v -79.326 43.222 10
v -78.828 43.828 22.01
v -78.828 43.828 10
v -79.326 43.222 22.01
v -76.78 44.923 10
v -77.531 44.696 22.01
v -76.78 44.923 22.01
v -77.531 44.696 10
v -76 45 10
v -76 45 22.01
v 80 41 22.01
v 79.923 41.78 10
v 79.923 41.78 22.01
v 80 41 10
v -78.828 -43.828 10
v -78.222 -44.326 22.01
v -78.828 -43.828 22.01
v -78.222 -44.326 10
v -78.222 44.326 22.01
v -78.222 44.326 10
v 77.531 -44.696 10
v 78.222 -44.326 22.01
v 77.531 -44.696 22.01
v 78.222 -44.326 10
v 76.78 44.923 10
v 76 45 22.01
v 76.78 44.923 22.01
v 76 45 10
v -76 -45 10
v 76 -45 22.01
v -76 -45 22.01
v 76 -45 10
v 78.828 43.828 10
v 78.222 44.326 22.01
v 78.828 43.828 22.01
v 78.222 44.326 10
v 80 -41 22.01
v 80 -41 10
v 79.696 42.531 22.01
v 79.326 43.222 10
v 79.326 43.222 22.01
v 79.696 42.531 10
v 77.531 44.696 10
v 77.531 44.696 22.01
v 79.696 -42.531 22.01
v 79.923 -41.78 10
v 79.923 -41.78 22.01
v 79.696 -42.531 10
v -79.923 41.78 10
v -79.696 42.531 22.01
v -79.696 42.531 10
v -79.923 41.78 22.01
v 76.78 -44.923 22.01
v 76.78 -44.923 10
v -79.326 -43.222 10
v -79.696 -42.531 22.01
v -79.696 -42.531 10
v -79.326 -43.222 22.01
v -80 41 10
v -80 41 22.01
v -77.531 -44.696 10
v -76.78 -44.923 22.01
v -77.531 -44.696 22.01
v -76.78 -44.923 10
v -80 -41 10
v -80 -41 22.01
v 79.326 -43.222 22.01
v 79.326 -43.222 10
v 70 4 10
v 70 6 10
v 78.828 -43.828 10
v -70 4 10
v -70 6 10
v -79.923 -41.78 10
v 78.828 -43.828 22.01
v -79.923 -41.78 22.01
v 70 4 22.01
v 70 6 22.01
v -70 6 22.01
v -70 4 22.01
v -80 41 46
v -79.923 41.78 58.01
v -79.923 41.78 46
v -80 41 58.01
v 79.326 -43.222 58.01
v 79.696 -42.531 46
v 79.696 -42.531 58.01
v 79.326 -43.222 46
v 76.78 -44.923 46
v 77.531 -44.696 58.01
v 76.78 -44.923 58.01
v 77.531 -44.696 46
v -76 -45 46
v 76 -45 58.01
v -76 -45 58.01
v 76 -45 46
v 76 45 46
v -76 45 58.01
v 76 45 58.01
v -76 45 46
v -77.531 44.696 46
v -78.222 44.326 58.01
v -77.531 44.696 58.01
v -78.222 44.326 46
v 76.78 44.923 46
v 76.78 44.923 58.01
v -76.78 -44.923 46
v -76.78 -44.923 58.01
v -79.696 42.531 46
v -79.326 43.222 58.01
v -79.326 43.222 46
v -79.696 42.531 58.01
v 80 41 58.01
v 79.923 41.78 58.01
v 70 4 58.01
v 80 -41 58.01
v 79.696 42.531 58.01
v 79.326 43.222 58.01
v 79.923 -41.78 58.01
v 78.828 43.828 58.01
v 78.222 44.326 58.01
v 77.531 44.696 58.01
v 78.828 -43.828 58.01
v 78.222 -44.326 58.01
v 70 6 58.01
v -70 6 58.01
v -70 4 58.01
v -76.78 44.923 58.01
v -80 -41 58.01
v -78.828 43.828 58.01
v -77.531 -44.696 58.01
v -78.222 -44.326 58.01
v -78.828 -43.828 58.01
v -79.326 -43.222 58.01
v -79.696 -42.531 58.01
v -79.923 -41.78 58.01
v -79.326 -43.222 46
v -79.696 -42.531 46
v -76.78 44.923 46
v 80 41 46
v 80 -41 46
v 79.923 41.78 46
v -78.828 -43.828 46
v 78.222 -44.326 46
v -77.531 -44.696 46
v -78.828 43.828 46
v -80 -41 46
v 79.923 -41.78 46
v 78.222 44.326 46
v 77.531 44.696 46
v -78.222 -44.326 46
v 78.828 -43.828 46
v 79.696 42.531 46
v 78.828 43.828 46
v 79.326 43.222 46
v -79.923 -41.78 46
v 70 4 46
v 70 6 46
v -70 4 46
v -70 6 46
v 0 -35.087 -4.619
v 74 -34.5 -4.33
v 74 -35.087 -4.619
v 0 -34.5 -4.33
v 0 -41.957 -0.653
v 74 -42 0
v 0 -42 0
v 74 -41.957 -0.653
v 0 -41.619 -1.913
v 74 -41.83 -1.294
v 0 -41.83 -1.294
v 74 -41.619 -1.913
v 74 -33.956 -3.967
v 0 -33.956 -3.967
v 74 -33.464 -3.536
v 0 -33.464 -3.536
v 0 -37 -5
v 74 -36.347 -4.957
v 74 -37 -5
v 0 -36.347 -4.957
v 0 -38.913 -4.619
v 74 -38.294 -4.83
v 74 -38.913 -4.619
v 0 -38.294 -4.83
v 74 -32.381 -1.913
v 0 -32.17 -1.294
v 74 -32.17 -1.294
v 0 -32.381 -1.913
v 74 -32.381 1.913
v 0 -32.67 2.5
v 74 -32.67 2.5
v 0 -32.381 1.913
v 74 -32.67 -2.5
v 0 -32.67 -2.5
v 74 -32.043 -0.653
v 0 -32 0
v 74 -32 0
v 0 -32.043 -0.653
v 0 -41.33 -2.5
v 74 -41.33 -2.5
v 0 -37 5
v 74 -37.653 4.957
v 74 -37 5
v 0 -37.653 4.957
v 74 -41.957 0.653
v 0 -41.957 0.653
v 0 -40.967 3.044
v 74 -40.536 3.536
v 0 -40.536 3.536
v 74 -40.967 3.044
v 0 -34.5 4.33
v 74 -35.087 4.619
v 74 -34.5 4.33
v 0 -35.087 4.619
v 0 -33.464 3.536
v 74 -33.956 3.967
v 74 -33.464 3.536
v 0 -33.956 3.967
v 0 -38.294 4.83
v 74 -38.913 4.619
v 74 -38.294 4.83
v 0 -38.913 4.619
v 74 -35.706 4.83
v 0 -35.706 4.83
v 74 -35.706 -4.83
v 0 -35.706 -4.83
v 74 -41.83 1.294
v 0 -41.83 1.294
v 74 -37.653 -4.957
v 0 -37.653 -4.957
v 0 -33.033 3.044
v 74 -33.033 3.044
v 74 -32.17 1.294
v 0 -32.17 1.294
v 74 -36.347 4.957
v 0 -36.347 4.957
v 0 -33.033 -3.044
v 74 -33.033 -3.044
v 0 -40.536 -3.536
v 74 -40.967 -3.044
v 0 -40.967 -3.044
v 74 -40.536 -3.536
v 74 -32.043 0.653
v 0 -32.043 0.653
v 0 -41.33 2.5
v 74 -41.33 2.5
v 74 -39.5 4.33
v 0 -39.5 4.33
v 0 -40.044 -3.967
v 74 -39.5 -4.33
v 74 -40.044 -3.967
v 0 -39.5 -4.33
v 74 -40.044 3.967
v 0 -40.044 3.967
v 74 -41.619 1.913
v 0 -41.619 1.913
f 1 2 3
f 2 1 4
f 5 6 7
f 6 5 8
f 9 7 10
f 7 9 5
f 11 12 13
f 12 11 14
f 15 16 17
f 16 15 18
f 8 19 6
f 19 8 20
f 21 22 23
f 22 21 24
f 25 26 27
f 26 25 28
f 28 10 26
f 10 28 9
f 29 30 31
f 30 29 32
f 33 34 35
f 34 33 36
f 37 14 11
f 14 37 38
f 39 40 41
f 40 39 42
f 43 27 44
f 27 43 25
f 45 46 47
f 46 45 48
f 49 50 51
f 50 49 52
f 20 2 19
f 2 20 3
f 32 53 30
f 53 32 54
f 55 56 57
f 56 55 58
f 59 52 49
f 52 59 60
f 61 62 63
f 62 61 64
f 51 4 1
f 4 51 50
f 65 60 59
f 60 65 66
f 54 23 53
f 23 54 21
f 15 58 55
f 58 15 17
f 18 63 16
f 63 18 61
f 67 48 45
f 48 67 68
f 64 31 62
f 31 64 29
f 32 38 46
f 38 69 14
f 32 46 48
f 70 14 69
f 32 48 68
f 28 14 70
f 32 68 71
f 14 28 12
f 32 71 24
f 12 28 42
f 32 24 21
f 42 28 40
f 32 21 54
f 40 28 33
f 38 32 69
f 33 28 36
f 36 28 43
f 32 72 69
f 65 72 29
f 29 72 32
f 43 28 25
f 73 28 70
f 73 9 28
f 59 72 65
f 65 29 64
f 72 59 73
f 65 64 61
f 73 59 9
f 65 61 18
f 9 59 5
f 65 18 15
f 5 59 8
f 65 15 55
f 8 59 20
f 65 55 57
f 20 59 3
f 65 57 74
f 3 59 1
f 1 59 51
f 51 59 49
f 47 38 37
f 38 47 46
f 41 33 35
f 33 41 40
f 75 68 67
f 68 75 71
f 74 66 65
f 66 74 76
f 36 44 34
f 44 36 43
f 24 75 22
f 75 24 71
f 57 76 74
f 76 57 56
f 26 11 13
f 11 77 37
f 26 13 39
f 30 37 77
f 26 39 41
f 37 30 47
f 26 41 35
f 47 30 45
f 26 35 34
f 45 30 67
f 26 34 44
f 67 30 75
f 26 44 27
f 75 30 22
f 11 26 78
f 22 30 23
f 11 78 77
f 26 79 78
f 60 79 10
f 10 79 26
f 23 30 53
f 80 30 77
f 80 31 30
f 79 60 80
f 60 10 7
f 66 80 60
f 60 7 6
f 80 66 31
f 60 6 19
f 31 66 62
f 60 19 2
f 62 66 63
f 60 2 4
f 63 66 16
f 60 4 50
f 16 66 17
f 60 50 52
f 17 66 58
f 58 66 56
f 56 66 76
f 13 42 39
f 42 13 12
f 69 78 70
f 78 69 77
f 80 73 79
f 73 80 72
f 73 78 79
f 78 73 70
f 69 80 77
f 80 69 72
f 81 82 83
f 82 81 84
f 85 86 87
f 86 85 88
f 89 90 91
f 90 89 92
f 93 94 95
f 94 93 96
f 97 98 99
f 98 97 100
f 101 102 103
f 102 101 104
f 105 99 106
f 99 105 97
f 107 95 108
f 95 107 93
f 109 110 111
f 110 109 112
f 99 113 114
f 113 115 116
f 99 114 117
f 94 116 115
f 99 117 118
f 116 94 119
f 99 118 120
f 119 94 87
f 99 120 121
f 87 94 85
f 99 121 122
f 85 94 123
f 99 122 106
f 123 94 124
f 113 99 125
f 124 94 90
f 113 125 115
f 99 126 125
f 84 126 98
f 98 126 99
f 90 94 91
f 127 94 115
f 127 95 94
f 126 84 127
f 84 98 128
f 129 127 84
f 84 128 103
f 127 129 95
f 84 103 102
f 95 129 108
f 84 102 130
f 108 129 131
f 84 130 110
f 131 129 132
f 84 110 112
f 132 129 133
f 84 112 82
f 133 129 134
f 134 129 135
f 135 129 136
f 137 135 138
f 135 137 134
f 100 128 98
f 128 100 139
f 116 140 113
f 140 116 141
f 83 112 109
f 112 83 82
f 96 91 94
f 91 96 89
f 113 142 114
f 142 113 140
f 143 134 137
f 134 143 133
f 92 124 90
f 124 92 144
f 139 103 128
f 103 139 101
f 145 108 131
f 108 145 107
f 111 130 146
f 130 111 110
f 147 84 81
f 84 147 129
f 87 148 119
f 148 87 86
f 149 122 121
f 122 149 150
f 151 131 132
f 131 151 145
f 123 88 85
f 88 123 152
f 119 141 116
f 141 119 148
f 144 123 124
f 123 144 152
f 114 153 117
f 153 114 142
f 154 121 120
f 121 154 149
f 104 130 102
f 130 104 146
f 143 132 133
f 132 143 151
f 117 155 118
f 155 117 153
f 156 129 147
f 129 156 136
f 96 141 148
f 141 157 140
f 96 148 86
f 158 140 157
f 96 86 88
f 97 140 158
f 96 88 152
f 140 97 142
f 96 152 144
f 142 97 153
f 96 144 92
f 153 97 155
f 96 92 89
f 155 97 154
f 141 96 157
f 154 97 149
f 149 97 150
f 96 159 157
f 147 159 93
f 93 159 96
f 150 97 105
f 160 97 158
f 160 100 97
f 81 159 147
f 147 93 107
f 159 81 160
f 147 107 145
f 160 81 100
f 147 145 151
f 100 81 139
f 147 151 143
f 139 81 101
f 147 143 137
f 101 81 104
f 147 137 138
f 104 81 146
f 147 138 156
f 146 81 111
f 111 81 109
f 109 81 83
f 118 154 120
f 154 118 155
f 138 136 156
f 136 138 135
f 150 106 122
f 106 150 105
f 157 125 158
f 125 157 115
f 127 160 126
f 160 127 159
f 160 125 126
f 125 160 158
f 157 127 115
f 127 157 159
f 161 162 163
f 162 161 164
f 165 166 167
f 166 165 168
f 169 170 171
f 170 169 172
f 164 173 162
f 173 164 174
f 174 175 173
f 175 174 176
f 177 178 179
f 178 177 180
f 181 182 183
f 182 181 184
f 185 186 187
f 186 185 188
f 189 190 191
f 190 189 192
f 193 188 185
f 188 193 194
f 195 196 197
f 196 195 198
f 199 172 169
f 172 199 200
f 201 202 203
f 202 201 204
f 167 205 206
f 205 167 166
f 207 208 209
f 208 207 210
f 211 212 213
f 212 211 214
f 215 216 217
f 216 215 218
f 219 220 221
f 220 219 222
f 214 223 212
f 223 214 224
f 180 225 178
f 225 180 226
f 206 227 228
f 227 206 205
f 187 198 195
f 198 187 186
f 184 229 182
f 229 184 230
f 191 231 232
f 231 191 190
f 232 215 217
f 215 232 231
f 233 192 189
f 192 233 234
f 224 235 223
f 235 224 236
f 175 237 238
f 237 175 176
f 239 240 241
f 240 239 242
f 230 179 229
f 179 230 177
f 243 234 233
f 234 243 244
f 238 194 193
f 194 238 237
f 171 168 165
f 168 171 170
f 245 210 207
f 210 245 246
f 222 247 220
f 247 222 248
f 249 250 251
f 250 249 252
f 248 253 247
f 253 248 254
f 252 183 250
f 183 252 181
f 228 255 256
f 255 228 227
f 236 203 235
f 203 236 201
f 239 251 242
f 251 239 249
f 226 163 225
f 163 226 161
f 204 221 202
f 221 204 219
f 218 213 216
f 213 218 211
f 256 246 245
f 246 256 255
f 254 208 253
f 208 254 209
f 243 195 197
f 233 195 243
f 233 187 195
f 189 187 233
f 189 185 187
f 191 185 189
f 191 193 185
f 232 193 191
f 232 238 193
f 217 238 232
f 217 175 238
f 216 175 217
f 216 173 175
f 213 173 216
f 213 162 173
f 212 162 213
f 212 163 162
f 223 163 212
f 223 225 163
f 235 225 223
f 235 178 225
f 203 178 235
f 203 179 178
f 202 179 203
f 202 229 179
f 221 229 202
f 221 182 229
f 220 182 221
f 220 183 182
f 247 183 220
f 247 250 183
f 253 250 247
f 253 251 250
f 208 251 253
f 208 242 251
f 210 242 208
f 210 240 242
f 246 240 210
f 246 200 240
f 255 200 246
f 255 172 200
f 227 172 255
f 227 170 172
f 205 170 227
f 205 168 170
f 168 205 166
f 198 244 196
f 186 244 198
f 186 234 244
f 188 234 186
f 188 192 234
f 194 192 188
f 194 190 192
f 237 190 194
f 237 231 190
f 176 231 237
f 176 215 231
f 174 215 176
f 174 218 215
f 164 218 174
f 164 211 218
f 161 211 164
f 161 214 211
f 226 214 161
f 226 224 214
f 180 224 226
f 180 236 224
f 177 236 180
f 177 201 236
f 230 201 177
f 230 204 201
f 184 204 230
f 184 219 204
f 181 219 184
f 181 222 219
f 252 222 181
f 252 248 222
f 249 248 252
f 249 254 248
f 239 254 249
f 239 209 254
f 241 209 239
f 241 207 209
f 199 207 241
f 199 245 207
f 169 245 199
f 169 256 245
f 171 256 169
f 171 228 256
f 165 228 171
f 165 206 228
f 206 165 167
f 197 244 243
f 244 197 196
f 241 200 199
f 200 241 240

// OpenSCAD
// file: common/labels.scad
// Label zones for video explanation
module label_zone(name) {
  // placeholder for annotation in renders
  children();
}
// file: common/branding.scad
module gunnch_badge() {
  linear_extrude(badge_h) translate([0,0,0]) square([badge_w, badge_w/3], center=true);
}
// file: common/ports.scad
module usb_c_cutout() {
  translate([0,0,-1]) cube([9, 3.5, wall+2], center=true);
}
module usb_a_cutout() {
  translate([0,0,-1]) cube([12, 5, wall+2], center=true);
}
module audio_3_5_cutout() {
  translate([0,0,-1]) cylinder(h=wall+2, d=6, $fn=32);
}
// file: common/dimensions.scad
// Shared dimensions — EVT-0 concept only
wall = 2;
corner_r = 4;
badge_w = 12;
badge_h = 3;
// file: ds_xl_coder/ds_xl_coder_concept.scad
include <../common/dimensions.scad>
include <../common/ports.scad>

clamshell_l=160; clamshell_w=90; thickness=12;

module half(label_z) {
  difference() {
    translate([0,0,label_z]) minkowski() {
      cube([clamshell_l-2*corner_r, clamshell_w-2*corner_r, thickness], center=true);
      cylinder(r=corner_r, h=0.01, $fn=32);
    }
    // screen recess
    translate([0,5,label_z+thickness/2-1]) cube([clamshell_l-20, 2, clamshell_w-25], center=true);
  }
}

// hinge
translate([0,-clamshell_w/2+8,0]) rotate([0,90,0]) cylinder(h=clamshell_w-16, r=5, $fn=48);

difference() {
  union() {
    translate([0,0,thickness/2+2]) half(thickness/2+2);   // lower code screen
    translate([0,0,thickness*1.5+8]) half(thickness*1.5+8); // upper preview
  }
  translate([clamshell_l/2-4, -clamshell_w/2+10, thickness/2]) rotate([90,0,0]) usb_c_cutout();
  // pogo keyboard connector
  translate([0,-clamshell_w/2+4, thickness/2]) cube([50,2,2], center=true);
}
// file: common_modules.scad
// EVT-1 common modules — dimensions/tolerances are placeholders, not final mechanical drawings
include <common/dimensions.scad>
include <common/ports.scad>
include <common/branding.scad>
include <common/labels.scad>

module screw_boss(r=2.5, h=6) { cylinder(r=r, h=h, $fn=24); }
module service_panel(w=40, h=20, t=2) { cube([w, h, t]); }
module cooling_vent(w=60, slots=5) {
  for (i=[0:slots-1]) translate([i*12-w/2, 0, 0]) cube([8, 2, 4], center=true);
}
module battery_compartment(w=80, d=60, h=8) { cube([w, d, h], center=true); }
module label_zone(w=30, h=10) { translate([0,0,0.1]) cube([w, h, 0.2]); }
// main file
// EVT-1 placeholder — dimensions/tolerances not final mechanical drawings
// Re-exports concept model from ds_xl_coder/ds_xl_coder_concept.scad
include <common_modules.scad>
include <ds_xl_coder/ds_xl_coder_concept.scad>
